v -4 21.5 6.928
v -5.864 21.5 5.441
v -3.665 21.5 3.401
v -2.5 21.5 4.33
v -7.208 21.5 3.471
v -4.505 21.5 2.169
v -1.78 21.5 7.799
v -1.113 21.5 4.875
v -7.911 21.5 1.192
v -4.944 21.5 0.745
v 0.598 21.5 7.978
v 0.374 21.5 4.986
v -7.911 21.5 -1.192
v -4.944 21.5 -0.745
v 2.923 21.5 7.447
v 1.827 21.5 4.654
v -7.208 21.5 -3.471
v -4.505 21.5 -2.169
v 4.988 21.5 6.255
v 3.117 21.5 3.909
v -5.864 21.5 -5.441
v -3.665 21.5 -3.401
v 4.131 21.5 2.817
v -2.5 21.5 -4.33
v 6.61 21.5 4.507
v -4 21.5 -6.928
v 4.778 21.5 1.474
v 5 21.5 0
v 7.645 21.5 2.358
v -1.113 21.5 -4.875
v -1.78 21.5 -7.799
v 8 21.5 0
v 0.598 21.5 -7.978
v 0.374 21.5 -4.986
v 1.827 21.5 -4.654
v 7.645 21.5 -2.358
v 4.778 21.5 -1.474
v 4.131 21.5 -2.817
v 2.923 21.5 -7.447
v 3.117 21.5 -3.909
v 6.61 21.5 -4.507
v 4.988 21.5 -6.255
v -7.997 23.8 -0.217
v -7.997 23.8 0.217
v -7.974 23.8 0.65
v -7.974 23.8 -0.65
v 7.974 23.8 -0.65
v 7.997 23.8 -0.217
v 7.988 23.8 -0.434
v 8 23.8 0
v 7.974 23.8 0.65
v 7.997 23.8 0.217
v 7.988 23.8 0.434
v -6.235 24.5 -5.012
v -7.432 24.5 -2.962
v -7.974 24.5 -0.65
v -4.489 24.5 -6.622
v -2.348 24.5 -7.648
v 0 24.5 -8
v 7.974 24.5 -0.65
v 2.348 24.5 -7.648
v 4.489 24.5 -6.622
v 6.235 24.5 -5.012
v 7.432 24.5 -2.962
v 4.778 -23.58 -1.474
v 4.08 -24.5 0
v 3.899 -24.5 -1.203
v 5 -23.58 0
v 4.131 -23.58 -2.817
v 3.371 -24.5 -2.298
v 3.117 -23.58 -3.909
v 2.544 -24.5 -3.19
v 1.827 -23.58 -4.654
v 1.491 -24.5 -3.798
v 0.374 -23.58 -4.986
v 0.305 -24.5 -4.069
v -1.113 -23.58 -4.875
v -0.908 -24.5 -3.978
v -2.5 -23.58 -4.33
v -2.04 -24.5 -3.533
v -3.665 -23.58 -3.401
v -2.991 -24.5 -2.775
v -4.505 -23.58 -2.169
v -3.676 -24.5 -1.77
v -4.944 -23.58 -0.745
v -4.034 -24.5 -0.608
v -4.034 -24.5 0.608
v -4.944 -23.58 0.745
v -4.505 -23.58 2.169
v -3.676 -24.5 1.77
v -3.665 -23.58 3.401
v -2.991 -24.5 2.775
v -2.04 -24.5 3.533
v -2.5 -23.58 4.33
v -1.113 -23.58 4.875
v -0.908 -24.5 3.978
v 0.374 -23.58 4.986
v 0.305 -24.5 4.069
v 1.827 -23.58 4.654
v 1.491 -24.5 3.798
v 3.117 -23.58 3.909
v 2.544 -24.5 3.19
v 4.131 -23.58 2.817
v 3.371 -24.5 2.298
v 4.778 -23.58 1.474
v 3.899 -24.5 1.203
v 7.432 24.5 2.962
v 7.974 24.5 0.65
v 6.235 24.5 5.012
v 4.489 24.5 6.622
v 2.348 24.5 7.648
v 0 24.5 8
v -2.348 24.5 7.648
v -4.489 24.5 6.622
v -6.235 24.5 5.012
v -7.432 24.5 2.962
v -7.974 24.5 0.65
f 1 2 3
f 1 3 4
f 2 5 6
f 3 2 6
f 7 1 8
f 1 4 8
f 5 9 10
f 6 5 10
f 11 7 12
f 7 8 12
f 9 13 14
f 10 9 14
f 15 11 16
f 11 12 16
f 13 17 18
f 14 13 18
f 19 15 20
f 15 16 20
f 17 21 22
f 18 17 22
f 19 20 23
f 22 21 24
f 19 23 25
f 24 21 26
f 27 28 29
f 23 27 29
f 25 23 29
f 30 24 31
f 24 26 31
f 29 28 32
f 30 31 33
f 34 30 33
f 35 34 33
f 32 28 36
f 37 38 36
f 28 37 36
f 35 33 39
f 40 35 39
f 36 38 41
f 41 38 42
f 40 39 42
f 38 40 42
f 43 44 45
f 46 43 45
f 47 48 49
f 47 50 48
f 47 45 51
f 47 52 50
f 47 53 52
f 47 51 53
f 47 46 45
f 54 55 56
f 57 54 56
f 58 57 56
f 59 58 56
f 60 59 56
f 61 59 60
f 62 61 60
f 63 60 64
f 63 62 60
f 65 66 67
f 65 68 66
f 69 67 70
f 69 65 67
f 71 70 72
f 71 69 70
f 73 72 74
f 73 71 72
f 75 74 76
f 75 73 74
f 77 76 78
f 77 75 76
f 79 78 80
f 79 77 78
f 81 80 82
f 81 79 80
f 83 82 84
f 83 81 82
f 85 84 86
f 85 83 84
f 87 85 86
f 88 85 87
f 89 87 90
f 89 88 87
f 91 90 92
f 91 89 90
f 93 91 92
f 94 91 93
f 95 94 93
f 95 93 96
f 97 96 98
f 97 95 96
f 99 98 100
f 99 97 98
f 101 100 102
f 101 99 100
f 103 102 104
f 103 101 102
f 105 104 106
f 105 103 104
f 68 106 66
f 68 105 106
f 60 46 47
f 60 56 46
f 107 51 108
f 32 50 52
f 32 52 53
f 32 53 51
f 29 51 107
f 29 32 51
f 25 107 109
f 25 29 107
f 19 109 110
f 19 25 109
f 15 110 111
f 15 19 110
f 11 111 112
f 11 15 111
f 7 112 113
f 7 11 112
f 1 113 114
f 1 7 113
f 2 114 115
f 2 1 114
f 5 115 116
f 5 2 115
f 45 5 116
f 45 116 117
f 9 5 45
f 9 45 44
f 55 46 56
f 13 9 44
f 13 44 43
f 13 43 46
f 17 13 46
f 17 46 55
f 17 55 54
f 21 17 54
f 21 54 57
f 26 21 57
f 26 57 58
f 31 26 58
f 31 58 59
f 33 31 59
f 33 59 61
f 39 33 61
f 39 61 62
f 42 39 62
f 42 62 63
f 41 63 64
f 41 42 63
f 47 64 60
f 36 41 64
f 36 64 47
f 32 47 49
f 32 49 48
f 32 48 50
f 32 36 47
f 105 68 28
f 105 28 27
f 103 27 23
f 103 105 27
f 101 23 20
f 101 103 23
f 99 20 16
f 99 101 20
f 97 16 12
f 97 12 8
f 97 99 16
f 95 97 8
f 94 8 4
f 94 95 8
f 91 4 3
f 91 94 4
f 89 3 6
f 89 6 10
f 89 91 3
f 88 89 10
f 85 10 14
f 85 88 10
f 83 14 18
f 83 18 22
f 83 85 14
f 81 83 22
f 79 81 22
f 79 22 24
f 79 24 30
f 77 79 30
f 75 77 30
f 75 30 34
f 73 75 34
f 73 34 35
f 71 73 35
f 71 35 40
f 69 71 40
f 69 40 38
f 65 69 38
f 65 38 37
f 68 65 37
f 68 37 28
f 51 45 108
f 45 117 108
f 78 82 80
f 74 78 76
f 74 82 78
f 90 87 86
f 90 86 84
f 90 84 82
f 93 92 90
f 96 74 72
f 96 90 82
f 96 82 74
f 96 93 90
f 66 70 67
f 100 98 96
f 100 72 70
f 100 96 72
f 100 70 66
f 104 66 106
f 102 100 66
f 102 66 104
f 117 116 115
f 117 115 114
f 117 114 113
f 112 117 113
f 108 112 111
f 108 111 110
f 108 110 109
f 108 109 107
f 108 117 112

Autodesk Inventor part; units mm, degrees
sketch "Skizze_1" plane through (0, 21.5, 0) normal (0, 1, 0) x (1, 0, 0)
  circle A0 centre (0, 0) radius 8
extrude "Extrusion1" add sketch "Skizze_1" along normal blind 3
sketch "Skizze_3" plane through (0, 0, 0) normal (0, 0, 1) x (1, 0, 0)
  line L0 (-8, 24.5) -> (-8, 23.8)
  line L1 (-8, 23.8) -> (8, 23.8)
  line L2 (8, 23.8) -> (8, 24.5)
  line L3 (8, 24.5) -> (-8, 24.5)
extrude "Extrusion2" cut sketch "Skizze_3" along normal mid plane 1.3
sketch "Skizze_2" plane through (0, 0, 0) normal (0, 0, 1) x (1, 0, 0)
  line L0 (0, -24.5) -> (0, 21.5)
  line L1 (0, 21.5) -> (5, 21.5)
  line L2 (5, 21.5) -> (5, -23.58)
  line L3 (5, -23.58) -> (4.08, -24.5)
  line L4 (4.08, -24.5) -> (0, -24.5)
  line L5 (0, -24.5) -> (0, 21.5)
revolve "Revolution1" add sketch "Skizze_2" angle 360 about axis through (0, -24.5, 0) along (0, -1, 0)
thread "Thread1" size "M10x1.5" class "6g" standard "ISO Metric profile" length 14 offset 32
ref_plane "hebel_XY" through (0, 24.5, 0) normal (0, 1, 0) x (-1, 0, 0)
ref_plane "hebel_YZ" through (0, 24.5, 0) normal (-1, 0, 0) x (0, 0, 1)
ref_plane "hebel_ZX" through (0, 24.5, 0) normal (0, 0, 1) x (0, 1, 0)
properties part number "May Tec 1.63.14041/3_Clamping stud 40x40"
